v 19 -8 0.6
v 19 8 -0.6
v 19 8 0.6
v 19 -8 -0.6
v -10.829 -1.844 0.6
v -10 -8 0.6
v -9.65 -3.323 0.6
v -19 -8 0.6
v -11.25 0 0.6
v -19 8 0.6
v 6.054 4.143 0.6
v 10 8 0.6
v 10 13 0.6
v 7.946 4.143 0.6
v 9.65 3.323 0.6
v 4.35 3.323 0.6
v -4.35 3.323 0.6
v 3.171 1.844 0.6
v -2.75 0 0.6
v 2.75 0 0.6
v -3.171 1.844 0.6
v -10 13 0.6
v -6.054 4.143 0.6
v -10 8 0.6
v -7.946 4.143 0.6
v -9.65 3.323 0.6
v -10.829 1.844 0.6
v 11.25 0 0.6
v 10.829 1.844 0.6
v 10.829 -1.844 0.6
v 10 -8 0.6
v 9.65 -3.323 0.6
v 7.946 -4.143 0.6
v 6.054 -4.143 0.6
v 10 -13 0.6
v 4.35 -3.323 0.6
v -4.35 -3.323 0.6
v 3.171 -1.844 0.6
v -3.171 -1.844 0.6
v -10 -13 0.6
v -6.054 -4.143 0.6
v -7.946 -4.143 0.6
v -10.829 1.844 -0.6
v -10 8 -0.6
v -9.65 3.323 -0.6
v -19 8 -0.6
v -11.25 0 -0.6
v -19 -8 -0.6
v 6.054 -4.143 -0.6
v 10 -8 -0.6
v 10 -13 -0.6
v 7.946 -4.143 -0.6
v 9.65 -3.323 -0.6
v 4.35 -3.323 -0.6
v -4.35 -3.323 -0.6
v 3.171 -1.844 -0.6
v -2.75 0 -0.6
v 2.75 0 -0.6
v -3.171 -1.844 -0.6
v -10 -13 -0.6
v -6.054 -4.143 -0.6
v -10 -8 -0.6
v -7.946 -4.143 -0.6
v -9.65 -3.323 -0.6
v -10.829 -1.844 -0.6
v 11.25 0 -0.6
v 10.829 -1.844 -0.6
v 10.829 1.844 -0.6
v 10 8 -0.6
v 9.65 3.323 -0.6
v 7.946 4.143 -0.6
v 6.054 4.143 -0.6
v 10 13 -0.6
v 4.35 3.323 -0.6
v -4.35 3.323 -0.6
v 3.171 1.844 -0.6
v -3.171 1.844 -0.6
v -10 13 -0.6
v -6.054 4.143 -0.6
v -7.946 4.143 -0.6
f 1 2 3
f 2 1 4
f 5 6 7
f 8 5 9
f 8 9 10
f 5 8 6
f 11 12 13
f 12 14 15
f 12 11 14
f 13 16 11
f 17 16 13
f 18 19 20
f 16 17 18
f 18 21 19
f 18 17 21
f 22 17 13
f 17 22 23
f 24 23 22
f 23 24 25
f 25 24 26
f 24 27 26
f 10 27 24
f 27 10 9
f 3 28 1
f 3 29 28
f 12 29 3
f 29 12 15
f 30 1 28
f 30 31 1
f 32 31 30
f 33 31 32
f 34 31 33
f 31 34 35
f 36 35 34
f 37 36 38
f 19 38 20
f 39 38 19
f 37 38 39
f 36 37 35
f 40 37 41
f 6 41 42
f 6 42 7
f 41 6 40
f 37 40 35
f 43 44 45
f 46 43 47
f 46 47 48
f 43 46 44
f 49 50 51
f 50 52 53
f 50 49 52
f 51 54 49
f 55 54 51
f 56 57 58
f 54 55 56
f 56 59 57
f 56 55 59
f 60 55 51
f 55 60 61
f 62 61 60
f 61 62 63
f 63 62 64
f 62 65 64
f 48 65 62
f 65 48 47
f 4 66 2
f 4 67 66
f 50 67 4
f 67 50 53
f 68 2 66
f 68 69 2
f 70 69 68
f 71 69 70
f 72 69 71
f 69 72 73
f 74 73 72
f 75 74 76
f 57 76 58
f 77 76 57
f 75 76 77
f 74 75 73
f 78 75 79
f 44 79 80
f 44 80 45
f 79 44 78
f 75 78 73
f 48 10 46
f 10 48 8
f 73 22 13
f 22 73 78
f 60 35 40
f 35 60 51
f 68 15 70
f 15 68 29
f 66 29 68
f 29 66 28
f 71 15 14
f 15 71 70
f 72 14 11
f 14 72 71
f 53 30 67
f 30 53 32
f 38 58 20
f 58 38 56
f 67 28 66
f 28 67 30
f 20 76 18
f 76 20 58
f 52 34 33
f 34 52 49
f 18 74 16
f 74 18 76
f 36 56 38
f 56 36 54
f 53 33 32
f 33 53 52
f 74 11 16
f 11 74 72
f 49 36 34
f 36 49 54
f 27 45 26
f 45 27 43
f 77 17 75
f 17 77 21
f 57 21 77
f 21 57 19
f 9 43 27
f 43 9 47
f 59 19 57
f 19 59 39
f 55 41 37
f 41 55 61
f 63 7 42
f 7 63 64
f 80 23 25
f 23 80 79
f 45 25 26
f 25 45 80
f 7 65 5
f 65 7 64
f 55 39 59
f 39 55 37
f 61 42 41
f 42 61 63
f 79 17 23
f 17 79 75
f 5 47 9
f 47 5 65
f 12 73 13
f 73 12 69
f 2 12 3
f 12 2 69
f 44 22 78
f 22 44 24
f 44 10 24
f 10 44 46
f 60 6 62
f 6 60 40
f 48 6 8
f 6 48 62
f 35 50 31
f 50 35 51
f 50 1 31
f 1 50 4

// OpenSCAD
thickness = 1.2;
difference() {
	cube([38,26,thickness], center=true);
	translate([14/2,0,0]) cylinder(r=4.25, h = thickness+1, center=true);
	translate([-14/2,0,0]) cylinder(r=4.25, h = thickness+1, center=true);
	translate([38/2, 26/2, 0]) corner();
	translate([-38/2, 26/2, 0]) corner();
	translate([-38/2, -26/2, 0]) corner();
	translate([38/2, -26/2, 0]) corner();
}
module corner() {
	cube([9*2,5*2,thickness+1], center = true);
}
